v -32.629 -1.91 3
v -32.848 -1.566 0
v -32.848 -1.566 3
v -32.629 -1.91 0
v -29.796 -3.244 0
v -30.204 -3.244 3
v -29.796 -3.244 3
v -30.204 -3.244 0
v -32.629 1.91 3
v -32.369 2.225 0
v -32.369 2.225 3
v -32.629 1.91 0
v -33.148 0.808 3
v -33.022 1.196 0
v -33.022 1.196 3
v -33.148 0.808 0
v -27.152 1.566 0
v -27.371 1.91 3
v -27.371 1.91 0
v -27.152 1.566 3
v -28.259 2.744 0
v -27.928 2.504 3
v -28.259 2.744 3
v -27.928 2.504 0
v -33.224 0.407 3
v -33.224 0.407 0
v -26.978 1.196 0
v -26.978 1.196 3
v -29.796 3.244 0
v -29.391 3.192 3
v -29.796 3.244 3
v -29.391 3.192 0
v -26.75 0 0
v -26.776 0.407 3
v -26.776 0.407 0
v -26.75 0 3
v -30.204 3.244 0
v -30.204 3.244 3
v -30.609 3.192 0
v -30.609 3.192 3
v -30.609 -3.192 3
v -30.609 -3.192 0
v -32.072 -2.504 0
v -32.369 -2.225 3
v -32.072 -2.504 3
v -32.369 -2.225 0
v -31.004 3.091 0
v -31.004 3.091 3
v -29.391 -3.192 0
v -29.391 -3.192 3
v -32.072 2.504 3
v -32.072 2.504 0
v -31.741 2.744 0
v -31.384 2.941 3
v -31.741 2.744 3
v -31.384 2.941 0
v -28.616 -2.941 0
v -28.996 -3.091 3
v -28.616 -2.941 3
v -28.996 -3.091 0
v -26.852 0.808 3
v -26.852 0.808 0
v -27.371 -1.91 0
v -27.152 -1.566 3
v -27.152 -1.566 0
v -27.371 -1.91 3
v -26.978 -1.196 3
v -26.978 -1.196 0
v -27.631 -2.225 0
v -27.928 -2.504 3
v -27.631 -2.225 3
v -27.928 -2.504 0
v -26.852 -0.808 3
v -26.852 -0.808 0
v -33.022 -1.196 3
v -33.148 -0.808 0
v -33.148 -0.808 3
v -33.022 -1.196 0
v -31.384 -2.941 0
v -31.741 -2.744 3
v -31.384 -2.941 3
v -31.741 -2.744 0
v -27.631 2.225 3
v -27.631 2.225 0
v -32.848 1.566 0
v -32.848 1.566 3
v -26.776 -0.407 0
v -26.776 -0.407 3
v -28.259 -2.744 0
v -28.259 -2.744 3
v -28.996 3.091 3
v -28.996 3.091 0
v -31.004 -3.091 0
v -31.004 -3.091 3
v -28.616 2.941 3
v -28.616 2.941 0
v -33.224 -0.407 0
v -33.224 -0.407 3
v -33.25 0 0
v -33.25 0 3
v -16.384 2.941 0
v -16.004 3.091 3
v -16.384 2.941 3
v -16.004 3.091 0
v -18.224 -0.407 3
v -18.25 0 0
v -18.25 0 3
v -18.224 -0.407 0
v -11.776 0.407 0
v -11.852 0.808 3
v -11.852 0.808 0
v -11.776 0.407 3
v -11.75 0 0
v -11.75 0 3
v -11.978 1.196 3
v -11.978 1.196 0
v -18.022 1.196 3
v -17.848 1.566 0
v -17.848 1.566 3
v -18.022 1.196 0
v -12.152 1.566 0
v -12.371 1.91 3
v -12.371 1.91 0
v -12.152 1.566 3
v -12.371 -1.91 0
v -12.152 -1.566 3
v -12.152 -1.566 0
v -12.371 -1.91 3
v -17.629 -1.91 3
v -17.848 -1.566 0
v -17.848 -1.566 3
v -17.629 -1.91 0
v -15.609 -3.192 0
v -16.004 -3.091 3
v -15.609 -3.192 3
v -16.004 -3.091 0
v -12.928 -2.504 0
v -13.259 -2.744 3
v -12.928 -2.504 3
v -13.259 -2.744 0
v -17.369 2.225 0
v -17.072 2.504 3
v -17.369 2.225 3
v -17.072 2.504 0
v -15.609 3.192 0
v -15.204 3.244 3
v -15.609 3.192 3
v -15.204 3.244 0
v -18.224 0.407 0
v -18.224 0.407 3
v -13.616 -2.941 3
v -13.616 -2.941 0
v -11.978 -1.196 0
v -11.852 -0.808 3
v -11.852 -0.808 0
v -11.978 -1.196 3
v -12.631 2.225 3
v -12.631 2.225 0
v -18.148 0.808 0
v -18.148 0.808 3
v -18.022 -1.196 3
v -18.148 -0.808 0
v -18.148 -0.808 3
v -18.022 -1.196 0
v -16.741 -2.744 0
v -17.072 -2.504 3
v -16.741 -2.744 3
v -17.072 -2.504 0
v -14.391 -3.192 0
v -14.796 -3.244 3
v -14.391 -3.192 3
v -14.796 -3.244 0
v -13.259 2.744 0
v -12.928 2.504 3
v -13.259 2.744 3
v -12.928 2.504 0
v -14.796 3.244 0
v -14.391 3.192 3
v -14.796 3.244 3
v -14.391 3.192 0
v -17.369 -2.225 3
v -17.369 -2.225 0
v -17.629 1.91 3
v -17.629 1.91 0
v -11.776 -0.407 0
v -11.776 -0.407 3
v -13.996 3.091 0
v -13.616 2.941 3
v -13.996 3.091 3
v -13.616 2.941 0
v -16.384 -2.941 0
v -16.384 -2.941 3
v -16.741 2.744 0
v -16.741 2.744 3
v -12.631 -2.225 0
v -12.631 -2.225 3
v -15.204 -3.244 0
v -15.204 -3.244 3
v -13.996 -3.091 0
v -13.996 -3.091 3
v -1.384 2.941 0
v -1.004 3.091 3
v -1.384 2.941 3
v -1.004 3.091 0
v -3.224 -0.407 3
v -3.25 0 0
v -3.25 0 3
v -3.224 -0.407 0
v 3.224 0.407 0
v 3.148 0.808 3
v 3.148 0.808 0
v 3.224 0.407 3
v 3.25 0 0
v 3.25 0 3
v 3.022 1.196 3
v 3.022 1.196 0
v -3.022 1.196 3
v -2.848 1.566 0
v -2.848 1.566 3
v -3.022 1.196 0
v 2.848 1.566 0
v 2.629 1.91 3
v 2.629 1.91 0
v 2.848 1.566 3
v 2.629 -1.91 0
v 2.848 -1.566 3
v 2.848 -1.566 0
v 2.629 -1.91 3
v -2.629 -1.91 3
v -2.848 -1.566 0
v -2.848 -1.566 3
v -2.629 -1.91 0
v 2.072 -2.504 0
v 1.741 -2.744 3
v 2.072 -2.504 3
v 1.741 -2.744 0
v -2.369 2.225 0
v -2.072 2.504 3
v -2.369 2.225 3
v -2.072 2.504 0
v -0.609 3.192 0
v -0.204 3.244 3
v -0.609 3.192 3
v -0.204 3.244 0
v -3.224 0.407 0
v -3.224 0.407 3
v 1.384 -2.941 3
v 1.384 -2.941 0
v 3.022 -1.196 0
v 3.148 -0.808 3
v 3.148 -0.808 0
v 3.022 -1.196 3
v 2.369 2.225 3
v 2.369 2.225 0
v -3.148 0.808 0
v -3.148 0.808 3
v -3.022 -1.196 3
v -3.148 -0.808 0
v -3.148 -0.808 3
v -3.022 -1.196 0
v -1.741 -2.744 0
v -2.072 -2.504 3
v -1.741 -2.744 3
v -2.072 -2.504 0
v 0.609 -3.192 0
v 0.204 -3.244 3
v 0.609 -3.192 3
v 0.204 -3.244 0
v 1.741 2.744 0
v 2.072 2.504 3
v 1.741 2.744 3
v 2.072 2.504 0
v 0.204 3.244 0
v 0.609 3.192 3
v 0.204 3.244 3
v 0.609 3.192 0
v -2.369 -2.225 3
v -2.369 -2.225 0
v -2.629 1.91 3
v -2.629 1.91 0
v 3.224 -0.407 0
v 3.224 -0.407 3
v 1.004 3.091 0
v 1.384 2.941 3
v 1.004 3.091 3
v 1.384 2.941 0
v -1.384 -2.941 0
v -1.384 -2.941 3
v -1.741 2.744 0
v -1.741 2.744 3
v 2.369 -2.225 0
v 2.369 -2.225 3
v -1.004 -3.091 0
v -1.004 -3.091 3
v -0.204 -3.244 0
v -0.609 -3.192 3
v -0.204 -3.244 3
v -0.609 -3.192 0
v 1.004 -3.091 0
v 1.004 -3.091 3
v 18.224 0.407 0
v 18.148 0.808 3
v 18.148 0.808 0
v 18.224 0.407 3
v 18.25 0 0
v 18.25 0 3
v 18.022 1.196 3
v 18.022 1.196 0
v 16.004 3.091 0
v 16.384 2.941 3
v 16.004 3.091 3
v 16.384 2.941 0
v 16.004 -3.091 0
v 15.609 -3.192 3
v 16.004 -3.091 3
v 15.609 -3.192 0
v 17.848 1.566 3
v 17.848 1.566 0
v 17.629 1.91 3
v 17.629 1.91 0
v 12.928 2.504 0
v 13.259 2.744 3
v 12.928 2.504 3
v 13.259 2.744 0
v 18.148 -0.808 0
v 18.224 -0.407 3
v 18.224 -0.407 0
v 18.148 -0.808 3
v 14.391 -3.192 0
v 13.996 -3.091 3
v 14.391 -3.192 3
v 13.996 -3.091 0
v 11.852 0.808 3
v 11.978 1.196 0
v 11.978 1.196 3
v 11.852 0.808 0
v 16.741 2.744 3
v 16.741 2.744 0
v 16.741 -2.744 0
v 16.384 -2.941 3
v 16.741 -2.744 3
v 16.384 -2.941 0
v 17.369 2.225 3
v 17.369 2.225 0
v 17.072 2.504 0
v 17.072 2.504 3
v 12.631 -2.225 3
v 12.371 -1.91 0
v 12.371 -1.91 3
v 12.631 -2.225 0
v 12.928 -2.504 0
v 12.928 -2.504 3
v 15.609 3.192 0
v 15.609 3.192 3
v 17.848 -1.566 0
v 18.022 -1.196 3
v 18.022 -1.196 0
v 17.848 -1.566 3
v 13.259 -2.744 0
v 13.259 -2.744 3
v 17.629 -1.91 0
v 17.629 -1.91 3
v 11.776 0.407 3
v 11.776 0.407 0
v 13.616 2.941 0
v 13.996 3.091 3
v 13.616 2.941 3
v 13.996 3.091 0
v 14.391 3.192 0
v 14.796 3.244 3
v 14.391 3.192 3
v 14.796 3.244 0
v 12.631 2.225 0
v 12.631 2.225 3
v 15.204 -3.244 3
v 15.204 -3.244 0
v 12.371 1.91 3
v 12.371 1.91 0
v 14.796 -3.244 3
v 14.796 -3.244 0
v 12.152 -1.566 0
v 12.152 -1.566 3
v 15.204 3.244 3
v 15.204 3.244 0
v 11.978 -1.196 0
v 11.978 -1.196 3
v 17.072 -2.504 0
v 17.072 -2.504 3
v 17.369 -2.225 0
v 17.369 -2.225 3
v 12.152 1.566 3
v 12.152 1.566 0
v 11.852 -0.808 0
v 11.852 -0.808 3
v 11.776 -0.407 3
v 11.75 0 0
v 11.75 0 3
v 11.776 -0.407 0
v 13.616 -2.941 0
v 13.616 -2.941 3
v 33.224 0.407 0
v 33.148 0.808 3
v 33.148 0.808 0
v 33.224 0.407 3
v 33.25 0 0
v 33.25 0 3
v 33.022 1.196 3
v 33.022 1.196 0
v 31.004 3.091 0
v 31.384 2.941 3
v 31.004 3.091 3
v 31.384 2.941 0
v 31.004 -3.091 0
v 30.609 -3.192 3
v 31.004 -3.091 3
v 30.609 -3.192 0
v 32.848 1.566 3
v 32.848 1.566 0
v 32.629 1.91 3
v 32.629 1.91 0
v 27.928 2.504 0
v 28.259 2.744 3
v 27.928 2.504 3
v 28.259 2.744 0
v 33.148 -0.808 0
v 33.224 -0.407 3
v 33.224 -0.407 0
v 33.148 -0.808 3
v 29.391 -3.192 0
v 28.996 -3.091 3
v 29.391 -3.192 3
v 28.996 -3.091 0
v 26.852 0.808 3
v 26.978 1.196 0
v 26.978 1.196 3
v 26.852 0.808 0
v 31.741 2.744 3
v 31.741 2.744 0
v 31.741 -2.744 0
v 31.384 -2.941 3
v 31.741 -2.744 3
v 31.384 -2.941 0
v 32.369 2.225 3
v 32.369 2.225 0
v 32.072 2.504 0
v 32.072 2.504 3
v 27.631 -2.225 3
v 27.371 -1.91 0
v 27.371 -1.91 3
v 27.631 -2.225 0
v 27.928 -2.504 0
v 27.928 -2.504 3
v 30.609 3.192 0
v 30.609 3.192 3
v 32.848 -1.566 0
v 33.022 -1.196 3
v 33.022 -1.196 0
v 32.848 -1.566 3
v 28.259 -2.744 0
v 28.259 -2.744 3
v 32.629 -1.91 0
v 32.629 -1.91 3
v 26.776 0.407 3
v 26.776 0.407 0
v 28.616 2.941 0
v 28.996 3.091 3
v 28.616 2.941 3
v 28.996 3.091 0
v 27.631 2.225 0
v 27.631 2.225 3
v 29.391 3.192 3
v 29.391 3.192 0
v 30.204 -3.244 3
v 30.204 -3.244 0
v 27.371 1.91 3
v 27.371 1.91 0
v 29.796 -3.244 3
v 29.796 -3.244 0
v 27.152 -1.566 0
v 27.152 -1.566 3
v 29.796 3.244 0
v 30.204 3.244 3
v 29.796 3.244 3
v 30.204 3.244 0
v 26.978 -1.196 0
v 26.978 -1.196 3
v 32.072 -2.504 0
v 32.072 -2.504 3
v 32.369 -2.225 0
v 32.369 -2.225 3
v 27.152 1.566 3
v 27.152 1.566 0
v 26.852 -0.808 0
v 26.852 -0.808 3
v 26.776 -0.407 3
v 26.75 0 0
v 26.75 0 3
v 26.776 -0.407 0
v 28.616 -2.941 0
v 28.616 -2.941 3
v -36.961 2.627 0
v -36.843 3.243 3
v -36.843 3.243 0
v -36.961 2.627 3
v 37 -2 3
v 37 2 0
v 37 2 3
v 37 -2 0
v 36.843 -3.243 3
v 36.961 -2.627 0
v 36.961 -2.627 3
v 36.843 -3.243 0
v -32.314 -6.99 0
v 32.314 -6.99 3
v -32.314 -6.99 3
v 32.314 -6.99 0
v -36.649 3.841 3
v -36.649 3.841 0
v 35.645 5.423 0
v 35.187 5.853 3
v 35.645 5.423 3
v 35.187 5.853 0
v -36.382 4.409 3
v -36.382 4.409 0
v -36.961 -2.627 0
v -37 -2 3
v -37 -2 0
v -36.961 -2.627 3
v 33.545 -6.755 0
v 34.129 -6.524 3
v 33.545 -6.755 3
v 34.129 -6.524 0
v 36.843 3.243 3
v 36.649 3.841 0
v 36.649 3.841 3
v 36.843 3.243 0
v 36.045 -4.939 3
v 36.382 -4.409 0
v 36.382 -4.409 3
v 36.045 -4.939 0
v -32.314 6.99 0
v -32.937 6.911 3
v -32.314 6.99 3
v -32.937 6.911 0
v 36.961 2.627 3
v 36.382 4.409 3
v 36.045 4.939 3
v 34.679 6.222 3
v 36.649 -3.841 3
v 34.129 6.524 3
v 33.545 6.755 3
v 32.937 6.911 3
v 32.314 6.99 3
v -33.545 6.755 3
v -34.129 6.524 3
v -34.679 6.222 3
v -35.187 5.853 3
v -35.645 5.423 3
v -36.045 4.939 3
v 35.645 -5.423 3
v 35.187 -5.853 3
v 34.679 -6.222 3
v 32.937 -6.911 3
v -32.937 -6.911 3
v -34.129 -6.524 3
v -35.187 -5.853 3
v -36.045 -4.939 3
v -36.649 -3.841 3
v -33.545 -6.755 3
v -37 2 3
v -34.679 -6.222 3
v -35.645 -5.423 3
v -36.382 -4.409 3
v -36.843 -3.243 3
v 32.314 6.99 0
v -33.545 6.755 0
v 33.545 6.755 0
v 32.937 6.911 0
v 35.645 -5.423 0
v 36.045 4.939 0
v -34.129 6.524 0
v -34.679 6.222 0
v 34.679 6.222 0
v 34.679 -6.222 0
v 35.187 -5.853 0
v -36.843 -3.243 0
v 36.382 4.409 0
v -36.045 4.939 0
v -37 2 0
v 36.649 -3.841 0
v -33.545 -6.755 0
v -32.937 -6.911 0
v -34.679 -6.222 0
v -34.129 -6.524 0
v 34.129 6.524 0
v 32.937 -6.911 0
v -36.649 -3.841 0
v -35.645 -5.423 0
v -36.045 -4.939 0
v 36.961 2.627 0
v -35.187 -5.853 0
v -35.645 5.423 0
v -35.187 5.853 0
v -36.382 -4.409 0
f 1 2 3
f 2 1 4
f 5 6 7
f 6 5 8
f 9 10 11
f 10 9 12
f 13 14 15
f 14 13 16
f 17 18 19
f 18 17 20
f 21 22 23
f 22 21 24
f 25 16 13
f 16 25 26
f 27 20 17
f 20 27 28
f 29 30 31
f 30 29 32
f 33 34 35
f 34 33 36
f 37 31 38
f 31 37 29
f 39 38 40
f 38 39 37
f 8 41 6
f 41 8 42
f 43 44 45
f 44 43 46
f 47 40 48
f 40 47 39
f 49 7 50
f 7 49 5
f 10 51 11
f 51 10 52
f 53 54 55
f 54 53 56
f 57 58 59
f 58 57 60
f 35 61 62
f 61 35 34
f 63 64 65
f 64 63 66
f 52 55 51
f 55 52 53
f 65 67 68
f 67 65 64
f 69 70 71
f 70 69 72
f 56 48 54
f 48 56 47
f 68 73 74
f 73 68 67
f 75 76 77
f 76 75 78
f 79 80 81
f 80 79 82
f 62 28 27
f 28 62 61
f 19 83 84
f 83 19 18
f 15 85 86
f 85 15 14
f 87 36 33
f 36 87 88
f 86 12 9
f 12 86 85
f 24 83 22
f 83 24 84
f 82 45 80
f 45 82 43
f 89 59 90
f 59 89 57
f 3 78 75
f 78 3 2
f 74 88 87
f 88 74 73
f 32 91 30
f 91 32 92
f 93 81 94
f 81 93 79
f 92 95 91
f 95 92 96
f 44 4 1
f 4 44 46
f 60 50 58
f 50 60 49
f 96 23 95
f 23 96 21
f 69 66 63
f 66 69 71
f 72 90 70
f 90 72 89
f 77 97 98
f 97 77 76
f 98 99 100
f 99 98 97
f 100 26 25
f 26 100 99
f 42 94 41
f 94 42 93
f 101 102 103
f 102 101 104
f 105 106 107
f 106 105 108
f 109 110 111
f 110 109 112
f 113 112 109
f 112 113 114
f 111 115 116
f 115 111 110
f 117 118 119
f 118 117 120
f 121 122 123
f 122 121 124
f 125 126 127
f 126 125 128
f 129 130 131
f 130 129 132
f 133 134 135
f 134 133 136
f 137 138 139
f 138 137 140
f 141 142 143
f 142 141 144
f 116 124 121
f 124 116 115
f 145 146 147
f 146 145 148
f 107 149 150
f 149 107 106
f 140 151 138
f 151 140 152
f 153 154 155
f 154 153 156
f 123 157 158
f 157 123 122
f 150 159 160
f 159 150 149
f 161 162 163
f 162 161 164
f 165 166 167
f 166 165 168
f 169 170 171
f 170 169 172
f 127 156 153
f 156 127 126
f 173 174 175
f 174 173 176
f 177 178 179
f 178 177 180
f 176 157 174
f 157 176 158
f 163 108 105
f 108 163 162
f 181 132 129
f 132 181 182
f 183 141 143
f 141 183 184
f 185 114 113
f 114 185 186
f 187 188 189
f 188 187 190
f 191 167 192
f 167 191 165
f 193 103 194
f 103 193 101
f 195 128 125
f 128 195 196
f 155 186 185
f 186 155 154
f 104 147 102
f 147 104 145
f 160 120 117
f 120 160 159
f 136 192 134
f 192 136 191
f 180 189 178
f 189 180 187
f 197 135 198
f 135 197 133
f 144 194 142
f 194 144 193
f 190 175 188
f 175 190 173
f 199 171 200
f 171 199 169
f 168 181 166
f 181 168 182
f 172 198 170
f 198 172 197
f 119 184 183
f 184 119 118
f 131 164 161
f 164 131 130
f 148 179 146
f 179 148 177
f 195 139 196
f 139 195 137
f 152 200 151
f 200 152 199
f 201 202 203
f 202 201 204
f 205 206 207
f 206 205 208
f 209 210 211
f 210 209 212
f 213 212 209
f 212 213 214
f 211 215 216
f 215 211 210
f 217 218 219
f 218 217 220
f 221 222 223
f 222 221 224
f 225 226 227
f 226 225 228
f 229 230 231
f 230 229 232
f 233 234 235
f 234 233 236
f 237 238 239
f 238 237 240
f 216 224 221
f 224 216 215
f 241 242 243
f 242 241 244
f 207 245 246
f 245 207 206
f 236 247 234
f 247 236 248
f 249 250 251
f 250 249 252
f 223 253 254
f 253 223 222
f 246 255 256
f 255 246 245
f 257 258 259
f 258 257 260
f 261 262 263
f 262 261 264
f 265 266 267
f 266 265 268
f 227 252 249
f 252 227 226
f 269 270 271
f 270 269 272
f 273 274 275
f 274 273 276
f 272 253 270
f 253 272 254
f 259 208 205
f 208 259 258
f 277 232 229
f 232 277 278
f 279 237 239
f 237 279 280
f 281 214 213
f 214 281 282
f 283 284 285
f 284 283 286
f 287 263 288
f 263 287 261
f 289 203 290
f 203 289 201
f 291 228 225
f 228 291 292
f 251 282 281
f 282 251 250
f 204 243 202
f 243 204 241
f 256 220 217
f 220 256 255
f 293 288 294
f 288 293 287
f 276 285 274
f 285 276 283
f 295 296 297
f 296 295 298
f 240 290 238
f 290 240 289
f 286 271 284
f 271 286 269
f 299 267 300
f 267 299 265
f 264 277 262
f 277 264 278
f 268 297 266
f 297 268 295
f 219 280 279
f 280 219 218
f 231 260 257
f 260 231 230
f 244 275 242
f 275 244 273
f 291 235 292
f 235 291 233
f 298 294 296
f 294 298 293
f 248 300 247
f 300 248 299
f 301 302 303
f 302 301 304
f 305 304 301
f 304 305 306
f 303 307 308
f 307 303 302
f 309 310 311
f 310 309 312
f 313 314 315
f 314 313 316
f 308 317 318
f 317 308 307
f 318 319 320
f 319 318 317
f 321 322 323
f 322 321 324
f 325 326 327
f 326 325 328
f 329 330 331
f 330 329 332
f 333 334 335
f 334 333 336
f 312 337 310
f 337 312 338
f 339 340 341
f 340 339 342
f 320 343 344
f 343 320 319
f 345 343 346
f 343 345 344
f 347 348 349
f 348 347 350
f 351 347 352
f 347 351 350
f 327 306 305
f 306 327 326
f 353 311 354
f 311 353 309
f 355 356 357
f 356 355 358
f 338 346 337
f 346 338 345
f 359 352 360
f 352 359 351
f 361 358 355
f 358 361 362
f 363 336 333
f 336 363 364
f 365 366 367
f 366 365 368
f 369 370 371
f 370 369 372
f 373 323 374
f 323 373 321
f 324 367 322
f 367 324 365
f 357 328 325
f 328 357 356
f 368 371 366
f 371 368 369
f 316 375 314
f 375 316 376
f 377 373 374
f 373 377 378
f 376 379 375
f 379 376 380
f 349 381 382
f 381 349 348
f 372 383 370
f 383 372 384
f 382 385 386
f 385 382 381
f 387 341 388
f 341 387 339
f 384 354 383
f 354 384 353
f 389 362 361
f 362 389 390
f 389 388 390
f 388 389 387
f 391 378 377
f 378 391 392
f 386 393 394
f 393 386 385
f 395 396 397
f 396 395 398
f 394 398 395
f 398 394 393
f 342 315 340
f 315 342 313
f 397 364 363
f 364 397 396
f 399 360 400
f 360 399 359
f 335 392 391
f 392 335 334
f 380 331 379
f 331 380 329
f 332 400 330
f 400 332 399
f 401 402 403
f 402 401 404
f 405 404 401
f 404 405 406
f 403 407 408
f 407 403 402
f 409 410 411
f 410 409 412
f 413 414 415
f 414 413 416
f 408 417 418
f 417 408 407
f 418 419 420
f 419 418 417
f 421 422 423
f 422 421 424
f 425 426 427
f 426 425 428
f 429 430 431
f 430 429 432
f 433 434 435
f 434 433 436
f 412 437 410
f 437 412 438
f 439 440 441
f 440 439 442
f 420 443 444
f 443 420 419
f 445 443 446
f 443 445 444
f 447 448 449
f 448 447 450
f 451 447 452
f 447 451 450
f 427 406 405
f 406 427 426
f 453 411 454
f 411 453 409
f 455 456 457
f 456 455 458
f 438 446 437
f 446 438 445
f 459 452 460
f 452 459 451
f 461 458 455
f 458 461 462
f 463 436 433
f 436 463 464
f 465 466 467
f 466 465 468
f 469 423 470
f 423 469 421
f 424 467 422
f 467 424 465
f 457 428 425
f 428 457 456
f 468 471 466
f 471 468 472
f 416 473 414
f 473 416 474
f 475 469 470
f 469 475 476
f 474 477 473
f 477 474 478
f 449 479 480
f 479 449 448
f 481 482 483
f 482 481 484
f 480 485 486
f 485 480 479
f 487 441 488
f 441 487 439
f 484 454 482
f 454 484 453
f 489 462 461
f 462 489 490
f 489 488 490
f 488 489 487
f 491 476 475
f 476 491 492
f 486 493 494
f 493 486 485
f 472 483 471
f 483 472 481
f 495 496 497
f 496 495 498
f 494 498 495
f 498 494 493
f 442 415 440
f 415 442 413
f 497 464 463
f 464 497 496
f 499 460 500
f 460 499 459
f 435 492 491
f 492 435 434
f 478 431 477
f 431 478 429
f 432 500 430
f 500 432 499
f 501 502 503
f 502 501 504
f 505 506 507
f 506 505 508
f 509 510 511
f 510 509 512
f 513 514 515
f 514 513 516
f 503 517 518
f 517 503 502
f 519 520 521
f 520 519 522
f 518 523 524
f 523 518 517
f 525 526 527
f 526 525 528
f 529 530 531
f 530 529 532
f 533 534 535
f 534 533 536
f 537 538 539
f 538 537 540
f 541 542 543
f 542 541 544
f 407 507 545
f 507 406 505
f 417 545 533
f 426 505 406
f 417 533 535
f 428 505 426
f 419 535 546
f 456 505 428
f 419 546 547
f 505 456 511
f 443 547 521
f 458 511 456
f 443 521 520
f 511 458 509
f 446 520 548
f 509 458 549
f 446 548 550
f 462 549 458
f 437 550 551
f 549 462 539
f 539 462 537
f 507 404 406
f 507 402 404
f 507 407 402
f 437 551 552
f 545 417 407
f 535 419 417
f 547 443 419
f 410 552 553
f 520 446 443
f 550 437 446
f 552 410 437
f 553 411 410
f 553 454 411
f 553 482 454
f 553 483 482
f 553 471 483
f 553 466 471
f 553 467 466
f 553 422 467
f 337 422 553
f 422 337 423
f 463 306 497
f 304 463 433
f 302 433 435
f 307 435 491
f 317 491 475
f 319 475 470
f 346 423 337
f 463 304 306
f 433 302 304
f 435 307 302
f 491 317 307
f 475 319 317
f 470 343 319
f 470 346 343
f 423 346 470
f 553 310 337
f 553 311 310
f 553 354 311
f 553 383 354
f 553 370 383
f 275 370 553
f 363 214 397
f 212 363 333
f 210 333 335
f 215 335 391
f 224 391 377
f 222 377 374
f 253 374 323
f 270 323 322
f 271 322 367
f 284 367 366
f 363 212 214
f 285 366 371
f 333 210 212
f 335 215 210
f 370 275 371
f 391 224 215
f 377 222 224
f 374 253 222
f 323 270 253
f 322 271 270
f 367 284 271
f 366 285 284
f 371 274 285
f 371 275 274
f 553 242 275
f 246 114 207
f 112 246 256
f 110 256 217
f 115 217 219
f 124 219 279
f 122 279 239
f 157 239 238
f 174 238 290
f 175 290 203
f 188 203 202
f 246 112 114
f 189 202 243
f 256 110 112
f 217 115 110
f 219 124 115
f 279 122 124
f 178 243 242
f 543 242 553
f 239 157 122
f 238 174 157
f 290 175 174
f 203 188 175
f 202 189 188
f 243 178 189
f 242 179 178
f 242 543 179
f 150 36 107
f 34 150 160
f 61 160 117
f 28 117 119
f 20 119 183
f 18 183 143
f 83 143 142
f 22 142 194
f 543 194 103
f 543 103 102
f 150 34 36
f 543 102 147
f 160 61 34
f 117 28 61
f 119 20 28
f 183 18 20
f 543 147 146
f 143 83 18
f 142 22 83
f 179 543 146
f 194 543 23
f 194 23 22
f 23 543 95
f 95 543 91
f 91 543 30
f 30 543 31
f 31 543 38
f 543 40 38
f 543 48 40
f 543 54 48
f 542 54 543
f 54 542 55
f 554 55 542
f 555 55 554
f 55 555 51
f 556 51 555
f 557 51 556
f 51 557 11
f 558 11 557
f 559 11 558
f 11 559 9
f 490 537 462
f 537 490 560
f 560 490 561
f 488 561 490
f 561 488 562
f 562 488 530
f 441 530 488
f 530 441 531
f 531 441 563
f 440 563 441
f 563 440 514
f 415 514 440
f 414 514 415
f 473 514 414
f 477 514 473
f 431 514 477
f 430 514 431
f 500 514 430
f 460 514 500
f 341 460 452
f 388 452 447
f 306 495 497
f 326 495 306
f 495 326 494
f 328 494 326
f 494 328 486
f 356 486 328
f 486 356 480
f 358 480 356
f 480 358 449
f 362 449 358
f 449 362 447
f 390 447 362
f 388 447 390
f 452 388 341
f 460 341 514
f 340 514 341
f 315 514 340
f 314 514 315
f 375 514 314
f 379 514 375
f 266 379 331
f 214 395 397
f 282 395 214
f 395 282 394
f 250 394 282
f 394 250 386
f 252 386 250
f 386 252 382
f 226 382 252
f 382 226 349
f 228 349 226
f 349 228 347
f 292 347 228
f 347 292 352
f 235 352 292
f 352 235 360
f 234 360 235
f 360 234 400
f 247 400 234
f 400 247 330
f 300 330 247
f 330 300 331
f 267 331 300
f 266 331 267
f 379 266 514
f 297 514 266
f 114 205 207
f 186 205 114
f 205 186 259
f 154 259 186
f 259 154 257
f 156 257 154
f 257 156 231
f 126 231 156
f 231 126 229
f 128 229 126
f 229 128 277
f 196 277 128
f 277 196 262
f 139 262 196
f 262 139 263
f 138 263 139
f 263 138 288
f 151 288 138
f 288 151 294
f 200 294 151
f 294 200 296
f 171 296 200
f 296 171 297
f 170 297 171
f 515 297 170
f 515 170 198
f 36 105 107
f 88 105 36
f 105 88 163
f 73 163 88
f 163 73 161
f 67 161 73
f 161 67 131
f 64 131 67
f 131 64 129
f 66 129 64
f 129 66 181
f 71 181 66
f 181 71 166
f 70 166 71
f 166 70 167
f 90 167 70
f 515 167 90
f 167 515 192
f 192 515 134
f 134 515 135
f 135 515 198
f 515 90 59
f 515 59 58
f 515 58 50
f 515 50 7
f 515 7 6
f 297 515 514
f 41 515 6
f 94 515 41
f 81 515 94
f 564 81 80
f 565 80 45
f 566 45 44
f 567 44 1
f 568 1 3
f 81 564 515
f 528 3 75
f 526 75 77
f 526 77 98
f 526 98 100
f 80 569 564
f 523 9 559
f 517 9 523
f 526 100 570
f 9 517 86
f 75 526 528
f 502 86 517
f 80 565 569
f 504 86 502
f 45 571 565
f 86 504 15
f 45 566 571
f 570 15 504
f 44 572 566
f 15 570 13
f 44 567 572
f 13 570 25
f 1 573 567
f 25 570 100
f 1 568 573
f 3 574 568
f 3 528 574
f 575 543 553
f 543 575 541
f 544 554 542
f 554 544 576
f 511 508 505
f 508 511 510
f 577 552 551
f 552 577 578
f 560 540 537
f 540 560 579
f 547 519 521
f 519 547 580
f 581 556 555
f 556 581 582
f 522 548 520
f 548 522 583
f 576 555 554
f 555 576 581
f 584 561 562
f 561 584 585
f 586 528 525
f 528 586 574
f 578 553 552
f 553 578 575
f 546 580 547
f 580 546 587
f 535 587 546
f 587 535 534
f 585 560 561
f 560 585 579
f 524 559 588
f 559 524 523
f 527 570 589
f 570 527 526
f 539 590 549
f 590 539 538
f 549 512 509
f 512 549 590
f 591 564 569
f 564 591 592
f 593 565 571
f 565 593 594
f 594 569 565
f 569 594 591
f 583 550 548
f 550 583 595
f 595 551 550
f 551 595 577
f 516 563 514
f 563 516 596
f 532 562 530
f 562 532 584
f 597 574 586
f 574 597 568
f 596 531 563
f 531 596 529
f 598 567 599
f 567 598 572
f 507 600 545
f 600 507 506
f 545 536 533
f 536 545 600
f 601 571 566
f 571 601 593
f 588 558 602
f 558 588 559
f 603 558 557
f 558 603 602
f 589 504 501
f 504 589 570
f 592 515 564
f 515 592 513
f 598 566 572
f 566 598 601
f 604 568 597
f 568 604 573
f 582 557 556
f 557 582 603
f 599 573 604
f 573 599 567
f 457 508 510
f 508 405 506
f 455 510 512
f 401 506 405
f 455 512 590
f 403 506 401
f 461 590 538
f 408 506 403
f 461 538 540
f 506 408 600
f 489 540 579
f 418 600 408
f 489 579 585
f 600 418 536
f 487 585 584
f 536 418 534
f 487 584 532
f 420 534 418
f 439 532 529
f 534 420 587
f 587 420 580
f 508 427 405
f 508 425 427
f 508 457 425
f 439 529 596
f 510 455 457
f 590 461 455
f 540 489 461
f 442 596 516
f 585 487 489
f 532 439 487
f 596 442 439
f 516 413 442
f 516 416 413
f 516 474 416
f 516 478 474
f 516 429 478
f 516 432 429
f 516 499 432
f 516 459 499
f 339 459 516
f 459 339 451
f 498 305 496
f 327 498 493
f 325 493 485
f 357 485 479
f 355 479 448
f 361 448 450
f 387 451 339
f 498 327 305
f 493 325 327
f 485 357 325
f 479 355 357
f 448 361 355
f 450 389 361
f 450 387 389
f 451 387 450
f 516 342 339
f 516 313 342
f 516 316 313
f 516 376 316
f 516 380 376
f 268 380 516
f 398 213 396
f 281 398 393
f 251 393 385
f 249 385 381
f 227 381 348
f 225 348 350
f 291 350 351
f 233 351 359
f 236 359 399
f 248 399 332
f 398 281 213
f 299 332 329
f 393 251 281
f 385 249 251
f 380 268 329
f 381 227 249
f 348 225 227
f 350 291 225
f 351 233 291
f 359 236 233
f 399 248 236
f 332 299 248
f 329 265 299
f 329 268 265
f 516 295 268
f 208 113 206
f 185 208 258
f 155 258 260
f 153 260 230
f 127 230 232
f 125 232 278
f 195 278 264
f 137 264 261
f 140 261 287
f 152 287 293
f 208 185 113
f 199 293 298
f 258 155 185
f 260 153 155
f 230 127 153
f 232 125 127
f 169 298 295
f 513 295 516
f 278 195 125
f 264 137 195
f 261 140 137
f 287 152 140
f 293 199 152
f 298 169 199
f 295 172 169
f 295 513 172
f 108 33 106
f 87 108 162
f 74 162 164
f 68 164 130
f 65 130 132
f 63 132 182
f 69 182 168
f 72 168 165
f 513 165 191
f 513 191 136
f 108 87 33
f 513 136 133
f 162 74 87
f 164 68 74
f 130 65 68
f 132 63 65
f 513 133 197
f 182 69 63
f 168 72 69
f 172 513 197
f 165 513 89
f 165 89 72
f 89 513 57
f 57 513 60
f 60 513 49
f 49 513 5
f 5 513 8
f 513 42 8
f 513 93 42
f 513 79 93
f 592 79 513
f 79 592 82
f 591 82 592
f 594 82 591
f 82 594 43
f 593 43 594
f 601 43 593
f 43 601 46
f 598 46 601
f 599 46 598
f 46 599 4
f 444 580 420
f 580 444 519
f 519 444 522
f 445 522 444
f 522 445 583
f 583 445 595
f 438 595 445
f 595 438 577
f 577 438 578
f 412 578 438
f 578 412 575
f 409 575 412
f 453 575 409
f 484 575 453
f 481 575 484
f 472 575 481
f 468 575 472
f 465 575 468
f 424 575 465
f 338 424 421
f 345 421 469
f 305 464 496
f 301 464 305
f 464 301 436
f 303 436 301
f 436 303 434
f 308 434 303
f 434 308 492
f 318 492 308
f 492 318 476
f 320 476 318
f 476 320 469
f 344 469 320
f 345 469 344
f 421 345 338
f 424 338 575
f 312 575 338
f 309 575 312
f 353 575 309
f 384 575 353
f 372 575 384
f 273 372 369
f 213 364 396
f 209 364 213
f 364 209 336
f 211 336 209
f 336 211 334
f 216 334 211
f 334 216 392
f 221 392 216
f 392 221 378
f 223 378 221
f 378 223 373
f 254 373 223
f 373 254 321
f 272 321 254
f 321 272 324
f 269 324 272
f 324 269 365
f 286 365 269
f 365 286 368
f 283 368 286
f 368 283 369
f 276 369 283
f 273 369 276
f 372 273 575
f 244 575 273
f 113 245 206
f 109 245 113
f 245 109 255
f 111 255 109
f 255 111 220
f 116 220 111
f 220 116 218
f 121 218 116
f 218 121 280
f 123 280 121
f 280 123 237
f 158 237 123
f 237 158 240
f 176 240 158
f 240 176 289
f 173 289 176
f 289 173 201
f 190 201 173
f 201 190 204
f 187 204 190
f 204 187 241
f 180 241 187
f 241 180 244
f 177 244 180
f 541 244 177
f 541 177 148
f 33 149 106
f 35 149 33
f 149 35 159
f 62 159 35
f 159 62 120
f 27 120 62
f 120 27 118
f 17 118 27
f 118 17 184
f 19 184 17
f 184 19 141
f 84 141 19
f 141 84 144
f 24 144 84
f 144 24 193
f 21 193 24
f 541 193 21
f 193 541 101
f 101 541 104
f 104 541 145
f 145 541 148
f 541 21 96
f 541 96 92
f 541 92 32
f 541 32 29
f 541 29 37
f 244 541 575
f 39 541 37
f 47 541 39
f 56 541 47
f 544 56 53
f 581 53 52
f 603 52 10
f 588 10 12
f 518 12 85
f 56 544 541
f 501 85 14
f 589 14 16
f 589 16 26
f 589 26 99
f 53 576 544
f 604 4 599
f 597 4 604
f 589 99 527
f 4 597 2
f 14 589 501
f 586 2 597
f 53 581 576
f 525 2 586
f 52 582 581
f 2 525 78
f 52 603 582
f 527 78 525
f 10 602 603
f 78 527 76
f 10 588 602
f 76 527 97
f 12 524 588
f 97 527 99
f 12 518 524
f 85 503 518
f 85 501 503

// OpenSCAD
$fn = 50;


difference() {
	union() {
		hull() {
			translate(v = [-32.0000000000, 2.0000000000, 0]) {
				cylinder(h = 3, r = 5);
			}
			translate(v = [32.0000000000, 2.0000000000, 0]) {
				cylinder(h = 3, r = 5);
			}
			translate(v = [-32.0000000000, -2.0000000000, 0]) {
				cylinder(h = 3, r = 5);
			}
			translate(v = [32.0000000000, -2.0000000000, 0]) {
				cylinder(h = 3, r = 5);
			}
		}
	}
	union() {
		translate(v = [-30.0000000000, 0.0000000000, 0]) {
			translate(v = [0, 0, -100]) {
				cylinder(h = 200, r = 3.2500000000);
			}
		}
		translate(v = [-15.0000000000, 0.0000000000, 0]) {
			translate(v = [0, 0, -100]) {
				cylinder(h = 200, r = 3.2500000000);
			}
		}
		translate(v = [0, 0, -100]) {
			cylinder(h = 200, r = 3.2500000000);
		}
		translate(v = [15.0000000000, 0.0000000000, 0]) {
			translate(v = [0, 0, -100]) {
				cylinder(h = 200, r = 3.2500000000);
			}
		}
		translate(v = [30.0000000000, 0.0000000000, 0]) {
			translate(v = [0, 0, -100]) {
				cylinder(h = 200, r = 3.2500000000);
			}
		}
	}
}
